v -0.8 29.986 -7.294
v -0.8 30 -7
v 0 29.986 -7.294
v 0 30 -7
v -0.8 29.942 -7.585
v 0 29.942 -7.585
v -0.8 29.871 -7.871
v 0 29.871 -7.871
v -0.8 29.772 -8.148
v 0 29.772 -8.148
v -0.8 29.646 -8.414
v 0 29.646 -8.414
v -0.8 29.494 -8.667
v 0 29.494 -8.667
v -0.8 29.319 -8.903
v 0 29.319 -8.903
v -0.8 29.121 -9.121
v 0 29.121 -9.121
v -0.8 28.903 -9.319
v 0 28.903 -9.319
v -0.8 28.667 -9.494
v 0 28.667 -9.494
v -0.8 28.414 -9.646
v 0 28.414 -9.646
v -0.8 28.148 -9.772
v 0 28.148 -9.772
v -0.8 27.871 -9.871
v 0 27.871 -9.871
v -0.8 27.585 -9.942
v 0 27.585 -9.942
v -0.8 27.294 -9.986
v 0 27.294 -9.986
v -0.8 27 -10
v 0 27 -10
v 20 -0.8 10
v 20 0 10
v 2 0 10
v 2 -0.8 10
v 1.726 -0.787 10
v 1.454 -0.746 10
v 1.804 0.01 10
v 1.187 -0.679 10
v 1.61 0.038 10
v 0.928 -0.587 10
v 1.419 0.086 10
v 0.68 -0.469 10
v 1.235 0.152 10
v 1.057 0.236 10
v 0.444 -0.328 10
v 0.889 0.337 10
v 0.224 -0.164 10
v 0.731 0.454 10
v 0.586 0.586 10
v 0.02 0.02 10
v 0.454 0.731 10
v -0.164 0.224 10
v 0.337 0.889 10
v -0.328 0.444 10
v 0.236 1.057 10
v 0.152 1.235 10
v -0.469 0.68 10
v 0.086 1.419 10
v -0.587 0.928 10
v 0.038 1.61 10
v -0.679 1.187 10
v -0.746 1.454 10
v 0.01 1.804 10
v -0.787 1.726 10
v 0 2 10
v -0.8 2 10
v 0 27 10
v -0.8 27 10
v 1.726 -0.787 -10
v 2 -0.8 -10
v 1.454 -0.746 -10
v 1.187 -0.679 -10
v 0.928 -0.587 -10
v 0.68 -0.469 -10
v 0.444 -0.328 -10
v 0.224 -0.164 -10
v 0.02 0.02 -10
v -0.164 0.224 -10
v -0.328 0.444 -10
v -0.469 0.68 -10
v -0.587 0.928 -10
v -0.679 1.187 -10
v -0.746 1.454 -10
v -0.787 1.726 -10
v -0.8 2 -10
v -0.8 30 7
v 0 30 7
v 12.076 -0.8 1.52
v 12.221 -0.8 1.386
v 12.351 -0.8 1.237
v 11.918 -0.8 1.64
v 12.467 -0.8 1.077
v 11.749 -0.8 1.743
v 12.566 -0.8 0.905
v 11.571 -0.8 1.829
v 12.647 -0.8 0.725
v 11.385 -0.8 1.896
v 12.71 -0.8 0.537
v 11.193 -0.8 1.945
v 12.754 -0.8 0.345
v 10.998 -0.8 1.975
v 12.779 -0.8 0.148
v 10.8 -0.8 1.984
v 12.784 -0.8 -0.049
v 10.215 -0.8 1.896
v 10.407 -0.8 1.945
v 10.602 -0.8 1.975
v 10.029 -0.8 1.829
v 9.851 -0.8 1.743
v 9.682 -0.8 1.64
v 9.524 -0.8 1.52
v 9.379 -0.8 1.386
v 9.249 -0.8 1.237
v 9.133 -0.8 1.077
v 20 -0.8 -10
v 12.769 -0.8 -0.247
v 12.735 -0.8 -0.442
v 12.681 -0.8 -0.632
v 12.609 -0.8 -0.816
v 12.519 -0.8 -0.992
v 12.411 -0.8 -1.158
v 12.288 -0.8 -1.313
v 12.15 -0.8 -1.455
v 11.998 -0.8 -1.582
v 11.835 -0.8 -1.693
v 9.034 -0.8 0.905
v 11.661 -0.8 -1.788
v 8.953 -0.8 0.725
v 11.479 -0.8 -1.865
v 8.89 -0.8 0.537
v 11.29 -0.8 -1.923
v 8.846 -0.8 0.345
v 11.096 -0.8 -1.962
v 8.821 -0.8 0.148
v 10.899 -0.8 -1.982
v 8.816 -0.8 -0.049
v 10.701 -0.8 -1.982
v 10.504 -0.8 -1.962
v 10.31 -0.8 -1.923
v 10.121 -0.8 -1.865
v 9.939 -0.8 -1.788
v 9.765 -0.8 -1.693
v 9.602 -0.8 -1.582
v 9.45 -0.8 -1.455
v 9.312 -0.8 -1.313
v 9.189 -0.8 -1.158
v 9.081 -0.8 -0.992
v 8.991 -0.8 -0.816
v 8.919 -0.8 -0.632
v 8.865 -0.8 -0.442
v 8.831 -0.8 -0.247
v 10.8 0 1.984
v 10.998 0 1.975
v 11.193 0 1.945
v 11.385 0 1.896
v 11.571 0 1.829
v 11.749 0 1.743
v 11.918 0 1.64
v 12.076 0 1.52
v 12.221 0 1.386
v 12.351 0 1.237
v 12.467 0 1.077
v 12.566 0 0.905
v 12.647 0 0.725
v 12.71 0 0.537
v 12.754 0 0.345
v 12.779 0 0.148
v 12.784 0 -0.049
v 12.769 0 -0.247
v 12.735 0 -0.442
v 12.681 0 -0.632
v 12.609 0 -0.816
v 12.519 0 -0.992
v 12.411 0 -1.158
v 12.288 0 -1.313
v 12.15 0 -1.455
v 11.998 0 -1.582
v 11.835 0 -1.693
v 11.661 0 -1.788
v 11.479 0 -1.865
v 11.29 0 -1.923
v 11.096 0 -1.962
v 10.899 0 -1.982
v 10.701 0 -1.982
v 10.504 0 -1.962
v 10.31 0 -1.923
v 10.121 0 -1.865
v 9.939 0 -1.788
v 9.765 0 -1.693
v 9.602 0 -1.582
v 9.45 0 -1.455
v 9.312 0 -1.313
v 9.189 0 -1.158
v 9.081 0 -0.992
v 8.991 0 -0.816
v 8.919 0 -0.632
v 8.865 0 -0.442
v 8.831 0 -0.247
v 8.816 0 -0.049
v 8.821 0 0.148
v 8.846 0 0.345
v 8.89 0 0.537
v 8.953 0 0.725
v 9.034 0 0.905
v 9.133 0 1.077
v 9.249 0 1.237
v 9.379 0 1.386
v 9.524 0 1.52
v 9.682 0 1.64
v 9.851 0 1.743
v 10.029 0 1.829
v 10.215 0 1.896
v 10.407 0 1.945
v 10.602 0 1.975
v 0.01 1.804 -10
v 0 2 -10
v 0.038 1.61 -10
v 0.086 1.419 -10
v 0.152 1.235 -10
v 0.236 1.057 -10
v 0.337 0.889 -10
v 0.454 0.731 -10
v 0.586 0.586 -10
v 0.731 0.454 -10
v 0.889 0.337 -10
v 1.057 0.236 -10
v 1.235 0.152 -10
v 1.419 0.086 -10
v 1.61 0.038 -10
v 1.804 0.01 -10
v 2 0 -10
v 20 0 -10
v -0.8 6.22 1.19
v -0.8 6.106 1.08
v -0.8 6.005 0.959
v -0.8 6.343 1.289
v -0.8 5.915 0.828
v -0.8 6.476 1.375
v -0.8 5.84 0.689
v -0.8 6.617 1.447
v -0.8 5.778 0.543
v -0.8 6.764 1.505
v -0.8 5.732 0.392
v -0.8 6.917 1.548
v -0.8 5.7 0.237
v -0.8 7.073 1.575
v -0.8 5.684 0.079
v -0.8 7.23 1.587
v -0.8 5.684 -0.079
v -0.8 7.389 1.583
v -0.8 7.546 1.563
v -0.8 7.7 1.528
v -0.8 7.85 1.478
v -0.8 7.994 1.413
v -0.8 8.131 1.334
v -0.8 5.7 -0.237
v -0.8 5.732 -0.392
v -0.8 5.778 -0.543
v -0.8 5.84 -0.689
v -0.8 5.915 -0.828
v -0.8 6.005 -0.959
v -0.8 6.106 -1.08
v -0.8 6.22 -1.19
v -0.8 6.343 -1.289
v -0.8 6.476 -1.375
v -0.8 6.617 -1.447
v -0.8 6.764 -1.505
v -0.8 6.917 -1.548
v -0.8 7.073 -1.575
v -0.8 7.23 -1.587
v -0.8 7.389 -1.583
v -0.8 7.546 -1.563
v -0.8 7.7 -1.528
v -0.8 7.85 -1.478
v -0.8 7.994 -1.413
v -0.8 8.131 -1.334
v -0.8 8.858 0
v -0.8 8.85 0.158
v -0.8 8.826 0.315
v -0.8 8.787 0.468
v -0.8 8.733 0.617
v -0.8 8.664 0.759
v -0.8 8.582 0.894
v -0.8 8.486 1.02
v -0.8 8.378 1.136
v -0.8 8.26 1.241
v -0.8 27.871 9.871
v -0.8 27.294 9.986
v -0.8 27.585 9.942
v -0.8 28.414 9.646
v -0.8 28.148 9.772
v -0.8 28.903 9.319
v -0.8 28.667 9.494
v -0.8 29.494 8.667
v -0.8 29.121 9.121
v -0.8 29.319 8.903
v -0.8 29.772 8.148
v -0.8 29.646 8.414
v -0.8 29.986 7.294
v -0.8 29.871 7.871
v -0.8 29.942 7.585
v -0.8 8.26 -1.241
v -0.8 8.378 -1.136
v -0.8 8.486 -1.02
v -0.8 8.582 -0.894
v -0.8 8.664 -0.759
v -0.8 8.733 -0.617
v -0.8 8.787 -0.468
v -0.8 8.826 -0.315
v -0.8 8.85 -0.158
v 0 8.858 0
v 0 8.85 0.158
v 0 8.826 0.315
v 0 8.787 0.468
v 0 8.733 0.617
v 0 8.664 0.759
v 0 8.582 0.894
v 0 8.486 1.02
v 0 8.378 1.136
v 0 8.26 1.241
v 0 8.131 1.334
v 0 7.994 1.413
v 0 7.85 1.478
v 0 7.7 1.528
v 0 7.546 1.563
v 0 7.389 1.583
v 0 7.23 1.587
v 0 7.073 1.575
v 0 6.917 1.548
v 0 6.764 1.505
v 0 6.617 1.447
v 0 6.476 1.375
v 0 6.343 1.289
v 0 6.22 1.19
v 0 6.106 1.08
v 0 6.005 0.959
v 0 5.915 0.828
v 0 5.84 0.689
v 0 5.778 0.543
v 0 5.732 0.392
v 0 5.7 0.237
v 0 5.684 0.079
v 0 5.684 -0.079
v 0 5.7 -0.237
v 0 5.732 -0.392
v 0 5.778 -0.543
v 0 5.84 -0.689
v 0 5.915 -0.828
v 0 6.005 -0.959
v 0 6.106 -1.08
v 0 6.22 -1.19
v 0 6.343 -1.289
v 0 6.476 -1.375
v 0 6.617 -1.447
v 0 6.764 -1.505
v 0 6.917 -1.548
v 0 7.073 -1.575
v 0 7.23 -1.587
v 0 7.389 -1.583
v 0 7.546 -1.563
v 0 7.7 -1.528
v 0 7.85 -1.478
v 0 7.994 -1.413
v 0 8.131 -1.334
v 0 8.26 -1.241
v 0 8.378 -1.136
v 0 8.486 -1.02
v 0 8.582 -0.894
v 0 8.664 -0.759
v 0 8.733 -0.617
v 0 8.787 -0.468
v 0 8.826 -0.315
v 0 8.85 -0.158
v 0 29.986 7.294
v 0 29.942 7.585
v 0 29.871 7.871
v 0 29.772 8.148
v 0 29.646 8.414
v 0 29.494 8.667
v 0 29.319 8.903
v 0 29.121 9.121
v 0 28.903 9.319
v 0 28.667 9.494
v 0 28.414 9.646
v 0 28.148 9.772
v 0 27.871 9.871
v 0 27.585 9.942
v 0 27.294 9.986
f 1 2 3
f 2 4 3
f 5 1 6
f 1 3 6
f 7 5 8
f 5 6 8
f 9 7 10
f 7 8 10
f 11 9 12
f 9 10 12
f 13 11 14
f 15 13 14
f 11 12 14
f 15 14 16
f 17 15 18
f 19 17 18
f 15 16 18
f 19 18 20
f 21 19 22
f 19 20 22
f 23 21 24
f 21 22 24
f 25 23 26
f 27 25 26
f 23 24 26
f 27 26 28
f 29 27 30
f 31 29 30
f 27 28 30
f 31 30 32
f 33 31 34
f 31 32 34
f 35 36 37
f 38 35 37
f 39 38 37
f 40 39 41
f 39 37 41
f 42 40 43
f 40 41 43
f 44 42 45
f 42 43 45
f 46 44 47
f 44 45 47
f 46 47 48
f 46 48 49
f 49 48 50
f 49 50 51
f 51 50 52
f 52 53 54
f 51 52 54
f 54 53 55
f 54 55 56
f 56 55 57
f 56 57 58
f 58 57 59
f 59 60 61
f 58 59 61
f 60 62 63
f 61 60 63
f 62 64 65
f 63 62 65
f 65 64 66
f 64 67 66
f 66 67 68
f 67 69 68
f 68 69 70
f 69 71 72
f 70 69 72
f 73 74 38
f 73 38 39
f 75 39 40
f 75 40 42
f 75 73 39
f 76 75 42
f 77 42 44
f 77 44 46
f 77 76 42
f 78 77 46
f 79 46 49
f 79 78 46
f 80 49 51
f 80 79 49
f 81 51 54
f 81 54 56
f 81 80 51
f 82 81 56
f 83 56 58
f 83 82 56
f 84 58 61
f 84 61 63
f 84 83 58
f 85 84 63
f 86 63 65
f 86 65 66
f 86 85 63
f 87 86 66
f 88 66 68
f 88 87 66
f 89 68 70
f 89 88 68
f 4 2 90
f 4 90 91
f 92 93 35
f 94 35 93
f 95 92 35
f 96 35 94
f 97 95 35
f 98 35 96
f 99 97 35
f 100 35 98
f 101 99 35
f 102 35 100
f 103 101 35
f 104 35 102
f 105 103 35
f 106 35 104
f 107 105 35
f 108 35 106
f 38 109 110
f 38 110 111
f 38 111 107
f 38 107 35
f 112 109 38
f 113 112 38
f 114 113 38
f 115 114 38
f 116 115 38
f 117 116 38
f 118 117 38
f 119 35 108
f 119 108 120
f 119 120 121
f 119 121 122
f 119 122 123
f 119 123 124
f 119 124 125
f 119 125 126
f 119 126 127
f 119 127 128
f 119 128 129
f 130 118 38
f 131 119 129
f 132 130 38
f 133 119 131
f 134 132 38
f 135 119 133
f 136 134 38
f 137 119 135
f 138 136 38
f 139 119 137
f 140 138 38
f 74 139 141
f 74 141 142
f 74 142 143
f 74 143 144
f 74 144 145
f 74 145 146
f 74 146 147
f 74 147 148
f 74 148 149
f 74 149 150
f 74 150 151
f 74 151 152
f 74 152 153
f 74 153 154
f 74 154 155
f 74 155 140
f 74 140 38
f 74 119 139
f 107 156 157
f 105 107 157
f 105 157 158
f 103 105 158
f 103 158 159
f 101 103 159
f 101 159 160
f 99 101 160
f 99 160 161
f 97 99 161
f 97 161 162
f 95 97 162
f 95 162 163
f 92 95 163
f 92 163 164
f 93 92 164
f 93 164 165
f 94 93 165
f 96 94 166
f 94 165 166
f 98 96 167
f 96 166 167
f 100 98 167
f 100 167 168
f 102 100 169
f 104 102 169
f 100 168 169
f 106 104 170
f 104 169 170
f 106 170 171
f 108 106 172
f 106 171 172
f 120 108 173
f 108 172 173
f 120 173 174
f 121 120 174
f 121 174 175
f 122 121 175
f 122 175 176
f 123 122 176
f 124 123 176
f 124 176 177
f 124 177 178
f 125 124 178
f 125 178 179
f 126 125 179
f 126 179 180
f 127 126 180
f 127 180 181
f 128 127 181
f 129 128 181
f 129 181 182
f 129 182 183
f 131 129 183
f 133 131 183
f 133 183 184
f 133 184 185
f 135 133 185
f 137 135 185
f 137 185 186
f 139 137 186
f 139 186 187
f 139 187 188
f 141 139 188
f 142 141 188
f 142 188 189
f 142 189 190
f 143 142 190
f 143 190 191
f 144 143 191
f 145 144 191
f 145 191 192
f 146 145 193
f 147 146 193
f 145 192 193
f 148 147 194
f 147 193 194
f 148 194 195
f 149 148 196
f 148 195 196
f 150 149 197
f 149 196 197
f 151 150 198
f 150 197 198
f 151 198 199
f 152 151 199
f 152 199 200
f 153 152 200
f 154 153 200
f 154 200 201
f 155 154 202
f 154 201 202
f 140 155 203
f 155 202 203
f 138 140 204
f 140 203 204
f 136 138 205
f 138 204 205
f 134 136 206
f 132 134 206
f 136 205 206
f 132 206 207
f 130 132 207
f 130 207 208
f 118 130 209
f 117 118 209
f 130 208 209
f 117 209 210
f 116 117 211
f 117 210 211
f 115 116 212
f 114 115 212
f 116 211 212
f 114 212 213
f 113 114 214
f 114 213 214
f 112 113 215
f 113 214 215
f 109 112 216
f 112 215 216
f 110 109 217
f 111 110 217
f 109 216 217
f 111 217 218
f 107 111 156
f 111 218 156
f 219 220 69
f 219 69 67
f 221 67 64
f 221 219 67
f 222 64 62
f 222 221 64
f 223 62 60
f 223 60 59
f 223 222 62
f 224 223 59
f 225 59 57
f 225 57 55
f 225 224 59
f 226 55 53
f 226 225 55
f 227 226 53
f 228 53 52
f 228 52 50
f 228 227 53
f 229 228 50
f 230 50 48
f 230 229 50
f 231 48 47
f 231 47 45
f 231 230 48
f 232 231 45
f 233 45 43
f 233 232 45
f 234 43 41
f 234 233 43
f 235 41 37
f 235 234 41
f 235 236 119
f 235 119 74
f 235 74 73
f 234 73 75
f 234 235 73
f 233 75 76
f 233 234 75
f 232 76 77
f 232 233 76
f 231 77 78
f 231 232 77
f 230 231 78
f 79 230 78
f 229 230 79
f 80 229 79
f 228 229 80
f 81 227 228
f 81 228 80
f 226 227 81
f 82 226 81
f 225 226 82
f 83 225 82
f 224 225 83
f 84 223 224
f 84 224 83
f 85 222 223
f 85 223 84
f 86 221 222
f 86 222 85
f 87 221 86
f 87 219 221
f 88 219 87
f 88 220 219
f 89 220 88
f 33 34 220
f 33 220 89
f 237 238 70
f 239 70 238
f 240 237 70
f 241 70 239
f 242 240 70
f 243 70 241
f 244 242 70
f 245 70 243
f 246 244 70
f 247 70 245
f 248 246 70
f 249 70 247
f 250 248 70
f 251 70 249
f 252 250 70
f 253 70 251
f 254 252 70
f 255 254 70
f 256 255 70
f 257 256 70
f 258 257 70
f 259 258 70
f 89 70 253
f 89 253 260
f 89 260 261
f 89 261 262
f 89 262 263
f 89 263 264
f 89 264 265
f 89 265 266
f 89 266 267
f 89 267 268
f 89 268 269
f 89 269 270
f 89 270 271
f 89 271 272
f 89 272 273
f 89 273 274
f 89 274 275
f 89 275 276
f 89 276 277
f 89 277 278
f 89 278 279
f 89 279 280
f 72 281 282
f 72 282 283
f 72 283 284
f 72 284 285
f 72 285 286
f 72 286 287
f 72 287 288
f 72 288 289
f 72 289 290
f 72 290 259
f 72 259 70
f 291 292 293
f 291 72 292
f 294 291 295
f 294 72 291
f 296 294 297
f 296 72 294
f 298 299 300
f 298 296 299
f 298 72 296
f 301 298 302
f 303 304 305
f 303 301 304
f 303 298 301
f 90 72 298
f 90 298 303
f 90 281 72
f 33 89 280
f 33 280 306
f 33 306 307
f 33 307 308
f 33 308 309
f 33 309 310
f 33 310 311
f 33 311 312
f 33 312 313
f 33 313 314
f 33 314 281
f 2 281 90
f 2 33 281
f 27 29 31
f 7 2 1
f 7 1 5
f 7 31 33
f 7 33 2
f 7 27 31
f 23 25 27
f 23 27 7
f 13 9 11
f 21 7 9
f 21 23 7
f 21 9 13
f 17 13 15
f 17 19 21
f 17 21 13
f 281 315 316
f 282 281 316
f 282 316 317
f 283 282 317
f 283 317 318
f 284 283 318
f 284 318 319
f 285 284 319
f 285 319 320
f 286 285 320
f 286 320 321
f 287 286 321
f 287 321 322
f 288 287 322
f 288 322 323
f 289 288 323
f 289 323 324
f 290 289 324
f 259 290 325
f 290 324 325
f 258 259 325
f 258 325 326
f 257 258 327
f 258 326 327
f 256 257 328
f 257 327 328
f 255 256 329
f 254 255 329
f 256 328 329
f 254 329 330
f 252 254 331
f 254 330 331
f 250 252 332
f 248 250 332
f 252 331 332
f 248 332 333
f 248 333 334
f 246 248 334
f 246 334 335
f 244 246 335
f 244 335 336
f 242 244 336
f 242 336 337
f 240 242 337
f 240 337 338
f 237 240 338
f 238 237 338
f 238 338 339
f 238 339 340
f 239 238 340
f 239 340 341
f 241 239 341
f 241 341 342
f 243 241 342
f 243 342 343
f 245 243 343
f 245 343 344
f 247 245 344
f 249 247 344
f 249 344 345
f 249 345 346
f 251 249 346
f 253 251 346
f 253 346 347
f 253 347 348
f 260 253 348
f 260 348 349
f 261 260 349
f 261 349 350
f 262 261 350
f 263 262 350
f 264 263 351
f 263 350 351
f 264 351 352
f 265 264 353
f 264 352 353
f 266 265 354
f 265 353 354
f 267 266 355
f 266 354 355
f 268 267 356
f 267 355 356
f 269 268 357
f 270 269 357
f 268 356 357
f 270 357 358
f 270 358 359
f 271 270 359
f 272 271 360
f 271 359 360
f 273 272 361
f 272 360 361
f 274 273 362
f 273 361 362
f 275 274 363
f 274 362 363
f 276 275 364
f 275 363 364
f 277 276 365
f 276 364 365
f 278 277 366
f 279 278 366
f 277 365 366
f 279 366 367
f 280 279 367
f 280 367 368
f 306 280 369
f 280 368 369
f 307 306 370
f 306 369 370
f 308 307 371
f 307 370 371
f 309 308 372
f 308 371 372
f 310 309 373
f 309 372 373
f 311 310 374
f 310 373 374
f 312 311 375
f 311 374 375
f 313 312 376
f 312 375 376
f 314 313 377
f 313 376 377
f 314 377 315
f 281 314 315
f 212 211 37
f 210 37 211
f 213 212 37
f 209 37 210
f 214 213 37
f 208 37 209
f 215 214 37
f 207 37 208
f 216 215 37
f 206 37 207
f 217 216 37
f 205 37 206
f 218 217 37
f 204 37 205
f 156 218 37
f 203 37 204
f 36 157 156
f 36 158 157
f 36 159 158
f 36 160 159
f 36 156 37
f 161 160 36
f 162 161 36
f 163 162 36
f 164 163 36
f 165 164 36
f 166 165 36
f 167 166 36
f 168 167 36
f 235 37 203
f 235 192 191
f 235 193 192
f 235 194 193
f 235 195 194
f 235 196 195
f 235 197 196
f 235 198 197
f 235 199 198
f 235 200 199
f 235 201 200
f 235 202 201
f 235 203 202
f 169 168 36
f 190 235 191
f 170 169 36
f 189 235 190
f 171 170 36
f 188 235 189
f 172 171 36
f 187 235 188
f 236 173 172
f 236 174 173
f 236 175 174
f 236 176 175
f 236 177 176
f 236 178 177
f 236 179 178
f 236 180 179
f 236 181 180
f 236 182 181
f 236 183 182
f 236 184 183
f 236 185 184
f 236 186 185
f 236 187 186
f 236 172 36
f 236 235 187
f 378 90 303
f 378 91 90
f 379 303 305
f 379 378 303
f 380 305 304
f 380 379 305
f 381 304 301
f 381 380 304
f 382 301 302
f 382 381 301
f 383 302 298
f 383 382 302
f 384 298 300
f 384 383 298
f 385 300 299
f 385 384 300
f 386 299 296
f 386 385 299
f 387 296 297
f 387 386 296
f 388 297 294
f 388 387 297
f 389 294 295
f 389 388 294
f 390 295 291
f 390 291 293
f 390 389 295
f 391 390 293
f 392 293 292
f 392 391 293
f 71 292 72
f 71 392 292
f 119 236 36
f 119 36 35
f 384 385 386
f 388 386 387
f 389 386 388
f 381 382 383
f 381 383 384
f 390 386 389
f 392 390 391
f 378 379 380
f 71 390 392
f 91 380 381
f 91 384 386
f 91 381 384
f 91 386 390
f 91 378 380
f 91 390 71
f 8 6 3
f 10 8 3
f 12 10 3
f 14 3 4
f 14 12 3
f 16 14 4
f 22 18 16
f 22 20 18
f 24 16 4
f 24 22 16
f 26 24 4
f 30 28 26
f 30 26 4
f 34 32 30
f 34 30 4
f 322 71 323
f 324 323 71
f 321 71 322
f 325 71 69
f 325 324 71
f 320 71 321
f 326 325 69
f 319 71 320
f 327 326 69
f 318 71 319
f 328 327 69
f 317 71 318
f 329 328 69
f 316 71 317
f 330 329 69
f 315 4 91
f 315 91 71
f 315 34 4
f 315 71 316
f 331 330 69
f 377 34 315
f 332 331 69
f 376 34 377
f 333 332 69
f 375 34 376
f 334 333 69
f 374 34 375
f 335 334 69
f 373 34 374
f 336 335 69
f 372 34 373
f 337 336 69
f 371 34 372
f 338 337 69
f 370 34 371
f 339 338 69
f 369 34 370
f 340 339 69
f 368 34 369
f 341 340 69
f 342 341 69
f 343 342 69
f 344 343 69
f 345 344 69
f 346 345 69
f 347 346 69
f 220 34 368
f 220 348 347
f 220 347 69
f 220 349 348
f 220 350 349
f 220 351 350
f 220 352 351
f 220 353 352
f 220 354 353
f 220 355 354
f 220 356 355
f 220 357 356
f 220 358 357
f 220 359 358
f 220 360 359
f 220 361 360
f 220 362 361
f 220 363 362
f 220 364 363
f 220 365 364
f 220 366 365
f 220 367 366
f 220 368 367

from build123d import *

# Parameters (mm, degrees)
BASE_FLANGE1_DEPTH      = 10
BASE_FLANGE1_DEPTH_BACK = 10
SKETCH2_R               = 1.5875
CUT_EXTRUDE1_DEPTH      = 38.416573868
SKETCH3_R               = 1.984375
CUT_EXTRUDE2_DEPTH      = 10
FILLET1_R               = 3


# Sheet-metal steps are written as plain solids
with BuildPart() as part:
    # Sketch1 → Base-Flange1 (new, two sides: drawn at the far end of the back side and taken through both)
    with BuildSketch(Plane.XY.offset(-BASE_FLANGE1_DEPTH_BACK)):
        with BuildLine():
            Line((0, 30), (0, 2))
            ThreePointArc((0, 2), (0.585786438, 0.585786438), (2, 0))
            Line((2, 0), (20, 0))
            Line((20, 0), (20, -0.8))
            Line((20, -0.8), (2, -0.8))
            ThreePointArc((2, -0.8), (0.020101013, 0.020101013), (-0.8, 2))
            Line((-0.8, 2), (-0.8, 30))
            Line((-0.8, 30), (0, 30))
        make_face()
    extrude(amount=BASE_FLANGE1_DEPTH + BASE_FLANGE1_DEPTH_BACK)

    # Sketch2 → Cut-Extrude1 (cut, through all)
    with BuildSketch(Plane(origin=(0, 0, 0), x_dir=(0, 0, -1), z_dir=(1, 0, 0))):
        with Locations(Location((0, 7.27, 0), (0, 0, 90))):
            Circle(SKETCH2_R)
    extrude(amount=-CUT_EXTRUDE1_DEPTH, mode=Mode.SUBTRACT)

    # Sketch3 → Cut-Extrude2 (cut)
    with BuildSketch(Plane(origin=(0, 0, 0), x_dir=(1, 0, 0), z_dir=(0, 1, 0))):
        with Locations(Location((10.8, 0, 0), (0, 0, 270))):
            Circle(SKETCH3_R)
    extrude(amount=-CUT_EXTRUDE2_DEPTH, mode=Mode.SUBTRACT)

    # Fillet1
    fillet1_edges = [part.edges().sort_by_distance(p)[0] for p in [
        (-0.4, 30, 10),
        (-0.4, 30, -10),
    ]]
    fillet(fillet1_edges, radius=FILLET1_R)


solid = part.part
